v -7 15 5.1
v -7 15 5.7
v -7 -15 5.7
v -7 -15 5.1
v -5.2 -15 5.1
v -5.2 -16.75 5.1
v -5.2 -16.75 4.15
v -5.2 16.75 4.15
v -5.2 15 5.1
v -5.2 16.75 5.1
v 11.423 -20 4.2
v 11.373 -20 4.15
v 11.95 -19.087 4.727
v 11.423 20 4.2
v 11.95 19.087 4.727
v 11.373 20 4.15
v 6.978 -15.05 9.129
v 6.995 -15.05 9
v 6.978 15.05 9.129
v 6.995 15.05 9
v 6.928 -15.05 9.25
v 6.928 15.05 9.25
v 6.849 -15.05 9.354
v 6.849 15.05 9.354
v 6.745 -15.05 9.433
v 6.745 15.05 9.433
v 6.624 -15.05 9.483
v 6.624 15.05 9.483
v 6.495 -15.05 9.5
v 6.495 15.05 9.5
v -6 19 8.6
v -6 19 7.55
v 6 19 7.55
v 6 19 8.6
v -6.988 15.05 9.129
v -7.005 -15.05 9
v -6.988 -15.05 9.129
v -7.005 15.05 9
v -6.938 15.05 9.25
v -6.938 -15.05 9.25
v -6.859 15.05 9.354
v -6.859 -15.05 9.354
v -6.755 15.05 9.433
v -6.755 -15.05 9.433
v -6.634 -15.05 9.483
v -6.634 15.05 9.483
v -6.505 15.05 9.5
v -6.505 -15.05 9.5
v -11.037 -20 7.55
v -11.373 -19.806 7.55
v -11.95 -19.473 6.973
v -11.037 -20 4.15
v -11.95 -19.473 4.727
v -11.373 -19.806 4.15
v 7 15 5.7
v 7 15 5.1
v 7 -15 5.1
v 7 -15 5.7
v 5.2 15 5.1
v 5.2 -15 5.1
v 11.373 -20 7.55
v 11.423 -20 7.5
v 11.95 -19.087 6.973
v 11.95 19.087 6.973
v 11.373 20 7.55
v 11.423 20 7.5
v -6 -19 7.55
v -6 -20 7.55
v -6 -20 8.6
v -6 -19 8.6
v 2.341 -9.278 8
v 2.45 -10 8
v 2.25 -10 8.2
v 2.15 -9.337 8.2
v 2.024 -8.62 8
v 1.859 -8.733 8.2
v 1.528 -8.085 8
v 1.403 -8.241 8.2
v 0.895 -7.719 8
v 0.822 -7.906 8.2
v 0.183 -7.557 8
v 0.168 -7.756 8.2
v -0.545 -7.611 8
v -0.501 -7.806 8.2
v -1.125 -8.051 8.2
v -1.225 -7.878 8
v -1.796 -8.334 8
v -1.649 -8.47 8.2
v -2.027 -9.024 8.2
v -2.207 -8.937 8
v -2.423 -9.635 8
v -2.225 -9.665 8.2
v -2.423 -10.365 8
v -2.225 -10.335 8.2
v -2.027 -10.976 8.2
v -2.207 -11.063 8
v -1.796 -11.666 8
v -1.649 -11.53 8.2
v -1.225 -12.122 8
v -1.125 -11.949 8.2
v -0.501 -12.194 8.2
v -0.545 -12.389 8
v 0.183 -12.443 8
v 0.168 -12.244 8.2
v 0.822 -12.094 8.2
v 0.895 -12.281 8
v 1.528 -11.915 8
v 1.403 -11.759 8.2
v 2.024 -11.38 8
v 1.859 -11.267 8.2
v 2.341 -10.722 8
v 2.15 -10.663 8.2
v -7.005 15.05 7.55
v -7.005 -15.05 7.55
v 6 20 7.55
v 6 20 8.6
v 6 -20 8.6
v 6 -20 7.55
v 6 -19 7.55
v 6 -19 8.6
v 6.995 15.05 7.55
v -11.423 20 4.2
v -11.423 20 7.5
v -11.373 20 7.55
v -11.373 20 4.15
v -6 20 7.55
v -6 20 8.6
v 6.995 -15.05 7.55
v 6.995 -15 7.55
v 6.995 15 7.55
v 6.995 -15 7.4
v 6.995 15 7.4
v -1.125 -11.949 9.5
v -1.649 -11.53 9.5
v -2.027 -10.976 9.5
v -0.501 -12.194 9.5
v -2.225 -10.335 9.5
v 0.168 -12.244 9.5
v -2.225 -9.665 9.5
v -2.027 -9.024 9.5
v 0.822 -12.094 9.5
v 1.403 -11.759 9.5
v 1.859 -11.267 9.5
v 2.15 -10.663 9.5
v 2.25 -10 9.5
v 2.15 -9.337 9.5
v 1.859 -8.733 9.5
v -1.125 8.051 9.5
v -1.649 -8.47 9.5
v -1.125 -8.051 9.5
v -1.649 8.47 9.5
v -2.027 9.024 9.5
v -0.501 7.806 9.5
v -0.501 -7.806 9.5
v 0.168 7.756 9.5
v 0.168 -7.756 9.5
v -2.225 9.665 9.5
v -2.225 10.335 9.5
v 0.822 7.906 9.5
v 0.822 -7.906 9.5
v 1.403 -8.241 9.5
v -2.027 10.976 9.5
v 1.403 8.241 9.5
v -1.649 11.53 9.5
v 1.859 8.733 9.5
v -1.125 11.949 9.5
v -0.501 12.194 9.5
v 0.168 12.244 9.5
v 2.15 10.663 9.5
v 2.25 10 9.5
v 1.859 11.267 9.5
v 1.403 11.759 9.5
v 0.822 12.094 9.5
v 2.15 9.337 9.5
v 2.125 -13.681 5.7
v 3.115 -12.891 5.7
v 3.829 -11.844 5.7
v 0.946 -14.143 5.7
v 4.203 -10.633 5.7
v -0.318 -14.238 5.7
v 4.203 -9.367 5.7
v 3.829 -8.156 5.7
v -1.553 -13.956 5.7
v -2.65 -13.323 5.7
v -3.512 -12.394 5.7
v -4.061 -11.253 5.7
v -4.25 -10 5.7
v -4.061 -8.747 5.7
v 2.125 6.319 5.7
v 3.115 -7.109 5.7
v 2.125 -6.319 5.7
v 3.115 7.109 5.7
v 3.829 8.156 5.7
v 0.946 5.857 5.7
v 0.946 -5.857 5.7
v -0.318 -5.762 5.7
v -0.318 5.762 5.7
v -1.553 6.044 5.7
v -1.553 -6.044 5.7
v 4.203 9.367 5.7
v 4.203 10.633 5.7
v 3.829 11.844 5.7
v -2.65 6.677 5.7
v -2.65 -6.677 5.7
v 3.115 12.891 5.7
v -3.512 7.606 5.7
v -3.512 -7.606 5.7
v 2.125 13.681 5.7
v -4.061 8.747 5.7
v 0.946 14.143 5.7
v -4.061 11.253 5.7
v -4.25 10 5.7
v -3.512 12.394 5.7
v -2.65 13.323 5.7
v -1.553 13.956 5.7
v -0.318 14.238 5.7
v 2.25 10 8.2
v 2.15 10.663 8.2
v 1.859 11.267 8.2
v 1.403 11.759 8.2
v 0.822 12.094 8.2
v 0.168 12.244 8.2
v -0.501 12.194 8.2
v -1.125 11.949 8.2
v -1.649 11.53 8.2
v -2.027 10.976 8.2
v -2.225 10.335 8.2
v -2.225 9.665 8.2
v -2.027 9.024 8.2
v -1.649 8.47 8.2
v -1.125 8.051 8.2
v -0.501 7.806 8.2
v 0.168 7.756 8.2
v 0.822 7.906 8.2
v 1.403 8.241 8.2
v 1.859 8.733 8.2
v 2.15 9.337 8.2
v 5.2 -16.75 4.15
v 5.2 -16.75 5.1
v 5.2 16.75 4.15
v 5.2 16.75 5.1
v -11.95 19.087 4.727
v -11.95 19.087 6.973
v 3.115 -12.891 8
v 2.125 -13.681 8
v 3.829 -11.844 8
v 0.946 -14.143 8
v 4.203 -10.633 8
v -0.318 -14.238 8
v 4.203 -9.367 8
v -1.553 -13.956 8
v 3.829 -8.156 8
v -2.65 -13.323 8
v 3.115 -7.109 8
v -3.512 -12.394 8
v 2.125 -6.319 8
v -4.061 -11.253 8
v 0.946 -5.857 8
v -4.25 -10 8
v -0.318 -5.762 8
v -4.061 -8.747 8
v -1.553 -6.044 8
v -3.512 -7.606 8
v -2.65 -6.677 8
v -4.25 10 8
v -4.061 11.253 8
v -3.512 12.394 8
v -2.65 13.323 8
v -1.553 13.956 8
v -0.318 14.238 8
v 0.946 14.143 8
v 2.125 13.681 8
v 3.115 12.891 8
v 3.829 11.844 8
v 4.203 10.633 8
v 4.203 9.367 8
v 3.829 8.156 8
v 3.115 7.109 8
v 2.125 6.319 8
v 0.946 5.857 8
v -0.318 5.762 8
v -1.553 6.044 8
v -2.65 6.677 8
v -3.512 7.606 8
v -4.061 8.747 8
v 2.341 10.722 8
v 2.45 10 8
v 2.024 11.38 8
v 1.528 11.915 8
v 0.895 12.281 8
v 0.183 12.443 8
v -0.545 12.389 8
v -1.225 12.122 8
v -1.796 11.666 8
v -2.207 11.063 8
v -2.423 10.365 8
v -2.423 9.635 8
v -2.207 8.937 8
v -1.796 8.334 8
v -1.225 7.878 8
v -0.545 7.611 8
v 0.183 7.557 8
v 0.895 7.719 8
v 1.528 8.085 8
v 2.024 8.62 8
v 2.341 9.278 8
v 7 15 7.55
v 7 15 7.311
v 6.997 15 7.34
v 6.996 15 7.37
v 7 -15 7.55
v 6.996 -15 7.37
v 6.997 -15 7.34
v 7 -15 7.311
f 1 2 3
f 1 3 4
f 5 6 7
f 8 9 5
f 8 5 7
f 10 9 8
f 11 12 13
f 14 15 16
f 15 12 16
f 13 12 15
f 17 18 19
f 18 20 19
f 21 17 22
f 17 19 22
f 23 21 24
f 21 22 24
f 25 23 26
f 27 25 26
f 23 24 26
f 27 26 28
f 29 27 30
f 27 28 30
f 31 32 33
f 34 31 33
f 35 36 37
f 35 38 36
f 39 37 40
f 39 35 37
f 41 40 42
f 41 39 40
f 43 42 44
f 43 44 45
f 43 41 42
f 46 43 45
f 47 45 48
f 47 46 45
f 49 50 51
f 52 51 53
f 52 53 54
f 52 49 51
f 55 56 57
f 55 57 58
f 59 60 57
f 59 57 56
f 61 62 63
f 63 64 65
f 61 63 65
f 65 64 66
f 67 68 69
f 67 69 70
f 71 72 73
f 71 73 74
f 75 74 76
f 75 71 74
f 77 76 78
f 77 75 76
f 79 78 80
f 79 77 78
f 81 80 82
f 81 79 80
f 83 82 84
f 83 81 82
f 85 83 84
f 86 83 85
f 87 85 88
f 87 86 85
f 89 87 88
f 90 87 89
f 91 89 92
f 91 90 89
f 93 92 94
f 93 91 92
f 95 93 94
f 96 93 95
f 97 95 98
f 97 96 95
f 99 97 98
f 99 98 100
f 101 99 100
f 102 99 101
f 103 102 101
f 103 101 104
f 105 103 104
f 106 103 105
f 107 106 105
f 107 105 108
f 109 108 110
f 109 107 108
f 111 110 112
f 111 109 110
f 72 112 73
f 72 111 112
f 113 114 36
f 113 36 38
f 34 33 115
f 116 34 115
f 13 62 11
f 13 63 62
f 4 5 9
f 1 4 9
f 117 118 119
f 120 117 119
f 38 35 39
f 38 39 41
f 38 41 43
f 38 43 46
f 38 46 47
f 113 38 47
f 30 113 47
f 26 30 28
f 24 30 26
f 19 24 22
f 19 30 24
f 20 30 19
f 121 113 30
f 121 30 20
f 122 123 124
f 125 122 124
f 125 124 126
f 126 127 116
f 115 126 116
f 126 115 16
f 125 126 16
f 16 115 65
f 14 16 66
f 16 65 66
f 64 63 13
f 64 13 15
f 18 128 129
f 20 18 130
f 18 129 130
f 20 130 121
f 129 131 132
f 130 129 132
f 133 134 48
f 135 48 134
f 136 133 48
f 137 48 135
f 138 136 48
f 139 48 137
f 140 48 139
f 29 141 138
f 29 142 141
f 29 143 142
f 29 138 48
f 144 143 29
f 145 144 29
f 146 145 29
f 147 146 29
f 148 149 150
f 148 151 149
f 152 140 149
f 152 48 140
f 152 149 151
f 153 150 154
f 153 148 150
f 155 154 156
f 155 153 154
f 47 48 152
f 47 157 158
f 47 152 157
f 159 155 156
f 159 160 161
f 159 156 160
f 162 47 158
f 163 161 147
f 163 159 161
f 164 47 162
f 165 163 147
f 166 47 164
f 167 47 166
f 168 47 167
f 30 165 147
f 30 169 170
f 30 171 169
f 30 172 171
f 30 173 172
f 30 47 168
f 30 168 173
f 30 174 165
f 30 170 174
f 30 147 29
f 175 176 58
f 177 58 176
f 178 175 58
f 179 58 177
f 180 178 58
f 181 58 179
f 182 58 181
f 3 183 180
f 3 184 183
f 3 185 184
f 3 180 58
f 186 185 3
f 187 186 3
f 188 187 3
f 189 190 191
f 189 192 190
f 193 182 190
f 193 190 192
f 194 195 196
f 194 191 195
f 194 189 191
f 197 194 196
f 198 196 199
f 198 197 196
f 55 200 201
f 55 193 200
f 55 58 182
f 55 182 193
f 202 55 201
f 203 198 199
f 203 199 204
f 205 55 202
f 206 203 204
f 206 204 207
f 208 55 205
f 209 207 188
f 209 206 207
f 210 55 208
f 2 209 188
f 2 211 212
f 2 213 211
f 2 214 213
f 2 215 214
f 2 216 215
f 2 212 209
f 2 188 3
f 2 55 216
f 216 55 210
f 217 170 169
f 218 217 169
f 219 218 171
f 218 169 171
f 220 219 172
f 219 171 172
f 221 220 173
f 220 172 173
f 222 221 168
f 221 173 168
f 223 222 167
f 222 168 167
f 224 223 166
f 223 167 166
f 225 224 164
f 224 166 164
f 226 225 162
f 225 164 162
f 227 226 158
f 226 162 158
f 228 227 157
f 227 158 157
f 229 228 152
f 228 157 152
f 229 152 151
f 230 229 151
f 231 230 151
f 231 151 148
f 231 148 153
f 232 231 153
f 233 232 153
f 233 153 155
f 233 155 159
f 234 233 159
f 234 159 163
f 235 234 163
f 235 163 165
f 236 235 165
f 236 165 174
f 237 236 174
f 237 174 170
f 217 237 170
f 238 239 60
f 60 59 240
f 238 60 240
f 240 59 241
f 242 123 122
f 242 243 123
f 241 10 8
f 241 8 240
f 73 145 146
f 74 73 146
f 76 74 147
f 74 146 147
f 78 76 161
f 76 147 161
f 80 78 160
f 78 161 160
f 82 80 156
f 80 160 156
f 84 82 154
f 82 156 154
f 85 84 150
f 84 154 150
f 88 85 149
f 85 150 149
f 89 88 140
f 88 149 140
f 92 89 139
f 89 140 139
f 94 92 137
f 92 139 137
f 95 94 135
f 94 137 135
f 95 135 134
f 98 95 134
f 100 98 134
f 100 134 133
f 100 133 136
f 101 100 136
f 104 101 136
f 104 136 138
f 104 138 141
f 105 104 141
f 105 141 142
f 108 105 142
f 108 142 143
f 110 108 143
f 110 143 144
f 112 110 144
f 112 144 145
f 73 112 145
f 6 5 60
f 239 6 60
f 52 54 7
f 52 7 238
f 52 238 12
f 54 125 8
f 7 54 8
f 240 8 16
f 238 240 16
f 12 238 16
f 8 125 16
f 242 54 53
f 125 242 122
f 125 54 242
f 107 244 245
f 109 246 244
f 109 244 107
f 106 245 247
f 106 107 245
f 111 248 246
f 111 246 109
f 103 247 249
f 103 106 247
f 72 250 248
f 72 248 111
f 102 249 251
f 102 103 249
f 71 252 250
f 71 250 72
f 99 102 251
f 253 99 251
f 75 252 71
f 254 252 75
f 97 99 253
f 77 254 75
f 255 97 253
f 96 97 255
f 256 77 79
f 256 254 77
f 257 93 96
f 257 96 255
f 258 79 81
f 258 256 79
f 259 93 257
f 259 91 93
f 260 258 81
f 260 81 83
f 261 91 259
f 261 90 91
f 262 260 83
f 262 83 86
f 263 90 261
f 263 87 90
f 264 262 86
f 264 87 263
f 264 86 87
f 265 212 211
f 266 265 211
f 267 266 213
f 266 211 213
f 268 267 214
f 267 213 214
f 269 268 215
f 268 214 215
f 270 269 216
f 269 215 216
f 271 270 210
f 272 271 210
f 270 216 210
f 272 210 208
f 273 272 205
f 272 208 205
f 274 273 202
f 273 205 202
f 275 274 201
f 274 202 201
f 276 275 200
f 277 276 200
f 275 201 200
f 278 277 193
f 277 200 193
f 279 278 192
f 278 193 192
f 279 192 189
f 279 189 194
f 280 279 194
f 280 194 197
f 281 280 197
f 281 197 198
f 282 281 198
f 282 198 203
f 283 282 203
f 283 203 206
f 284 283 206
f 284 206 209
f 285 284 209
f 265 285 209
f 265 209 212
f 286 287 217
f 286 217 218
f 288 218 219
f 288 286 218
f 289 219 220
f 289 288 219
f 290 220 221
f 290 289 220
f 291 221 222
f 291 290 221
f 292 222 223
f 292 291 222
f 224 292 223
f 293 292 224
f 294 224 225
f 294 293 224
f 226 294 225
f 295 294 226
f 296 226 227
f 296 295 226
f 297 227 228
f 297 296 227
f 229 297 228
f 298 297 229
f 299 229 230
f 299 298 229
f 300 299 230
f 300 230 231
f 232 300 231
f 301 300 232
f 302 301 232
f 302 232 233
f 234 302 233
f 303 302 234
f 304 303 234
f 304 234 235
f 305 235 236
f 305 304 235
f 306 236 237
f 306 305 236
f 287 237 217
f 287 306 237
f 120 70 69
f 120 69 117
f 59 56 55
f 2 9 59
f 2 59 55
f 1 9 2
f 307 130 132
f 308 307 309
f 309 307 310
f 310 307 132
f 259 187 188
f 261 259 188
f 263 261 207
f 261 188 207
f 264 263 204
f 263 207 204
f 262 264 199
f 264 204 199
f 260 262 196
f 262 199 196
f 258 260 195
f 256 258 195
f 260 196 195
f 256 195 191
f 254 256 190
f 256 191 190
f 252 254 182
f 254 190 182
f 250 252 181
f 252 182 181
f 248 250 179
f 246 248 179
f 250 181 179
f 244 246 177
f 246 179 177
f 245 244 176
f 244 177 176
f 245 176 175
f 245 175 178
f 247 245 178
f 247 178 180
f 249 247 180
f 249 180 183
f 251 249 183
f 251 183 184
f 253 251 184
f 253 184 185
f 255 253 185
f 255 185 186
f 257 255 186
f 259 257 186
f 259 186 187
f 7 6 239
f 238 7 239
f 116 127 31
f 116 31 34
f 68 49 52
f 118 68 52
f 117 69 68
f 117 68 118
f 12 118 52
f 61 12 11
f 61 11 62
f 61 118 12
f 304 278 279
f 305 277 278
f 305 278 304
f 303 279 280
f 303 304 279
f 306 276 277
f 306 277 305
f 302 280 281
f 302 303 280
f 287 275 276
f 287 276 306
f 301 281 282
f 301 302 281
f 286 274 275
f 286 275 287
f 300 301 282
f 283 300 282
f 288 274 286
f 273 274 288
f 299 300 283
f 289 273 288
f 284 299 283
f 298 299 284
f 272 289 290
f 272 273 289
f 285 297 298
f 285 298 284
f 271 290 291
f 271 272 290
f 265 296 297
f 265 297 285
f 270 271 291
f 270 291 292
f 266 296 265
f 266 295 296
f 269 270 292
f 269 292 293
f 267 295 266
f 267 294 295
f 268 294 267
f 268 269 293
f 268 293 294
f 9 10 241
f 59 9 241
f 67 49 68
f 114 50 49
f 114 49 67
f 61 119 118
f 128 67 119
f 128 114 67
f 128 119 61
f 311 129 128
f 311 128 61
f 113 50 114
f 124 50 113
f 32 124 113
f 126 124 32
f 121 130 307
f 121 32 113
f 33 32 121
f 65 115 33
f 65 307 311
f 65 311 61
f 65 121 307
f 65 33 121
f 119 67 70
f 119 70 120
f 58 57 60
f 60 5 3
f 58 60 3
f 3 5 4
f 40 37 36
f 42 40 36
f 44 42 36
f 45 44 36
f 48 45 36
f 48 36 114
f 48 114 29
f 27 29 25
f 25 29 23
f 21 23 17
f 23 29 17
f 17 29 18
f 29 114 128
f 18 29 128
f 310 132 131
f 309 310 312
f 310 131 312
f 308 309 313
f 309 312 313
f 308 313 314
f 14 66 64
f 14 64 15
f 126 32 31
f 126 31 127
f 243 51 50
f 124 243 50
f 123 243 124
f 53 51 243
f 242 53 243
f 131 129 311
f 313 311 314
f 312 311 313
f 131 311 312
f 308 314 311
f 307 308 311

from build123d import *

# Parameters (mm, degrees)
SKETCH1_W                                        = 23.9
SKETCH1_H                                        = 40
BOSS_EXTRUDE1_DEPTH                              = 3.4
CUT_EXTRUDE1_DEPTH                               = 30
SKETCH3_W                                        = 14
SKETCH3_H                                        = 30.1
BOSS_EXTRUDE2_DEPTH                              = 1.95
SKETCH4_W                                        = 10.4
SKETCH4_H                                        = 30
CUT_EXTRUDE2_DEPTH                               = 1.55
CUT_EXTRUDE3_REACH                               = 2.95
SKETCH6_W                                        = 10.4
SKETCH6_H                                        = 1.75
CUT_EXTRUDE4_REACH                               = 2.95
SKETCH8_W                                        = 10.4
SKETCH8_H                                        = 1.75
SKETCH9_W                                        = 0.6
SKETCH9_H                                        = 30
CUT_EXTRUDE5_DEPTH                               = 1.8
SKETCH10_W                                       = 0.6
SKETCH10_H                                       = 30
CUT_EXTRUDE6_DEPTH                               = 1.8
SKETCH11_W                                       = 12
SKETCH11_H                                       = 1
BOSS_EXTRUDE3_DEPTH                              = 1.05
SKETCH12_W                                       = 12
SKETCH12_H                                       = 1
BOSS_EXTRUDE4_DEPTH                              = 1.05
CBORE_FOR_M4_HEX_HEAD_MACHINE_SCREW1_D           = 4.5
CBORE_FOR_M4_HEX_HEAD_MACHINE_SCREW1_DEPTH       = 3.8
CBORE_FOR_M4_HEX_HEAD_MACHINE_SCREW1_CBORE_D     = 8.5
CBORE_FOR_M4_HEX_HEAD_MACHINE_SCREW1_CBORE_DEPTH = 2.3
CHAMFER1_SIZE                                    = 0.527
CHAMFER1_SIZE2                                   = 0.913344887
CHAMFER1_PART_2_SIZE                             = 0.527
CHAMFER1_PART_2_SIZE2                            = 0.913344887
CHAMFER1_PART_3_SIZE                             = 0.527
CHAMFER1_PART_3_SIZE2                            = 0.913344887
CHAMFER2_SIZE                                    = 0.2
CHAMFER3_SIZE                                    = 0.577
CHAMFER4_SIZE                                    = 0.913344887
CHAMFER4_SIZE2                                   = 0.527
FILLET1_R                                        = 0.5


with BuildPart() as part:
    # Sketch1 → Boss-Extrude1 (new body)
    with BuildSketch(Plane.XY.offset(7.55)):
        Rectangle(SKETCH1_W, SKETCH1_H)
    extrude(amount=-BOSS_EXTRUDE1_DEPTH)

    # Sketch2 → Cut-Extrude1 (cut)
    with BuildSketch(Plane.XZ.offset(15)):
        with BuildLine():
            Line((7, 7.310697145), (7, 7.55))
            Line((7, 7.55), (6.995, 7.55))
            Line((6.995, 7.55), (6.995, 7.4))
            ThreePointArc((6.995, 7.4), (6.996250978, 7.35527864), (7, 7.310697145))
        make_face()
    extrude(amount=-CUT_EXTRUDE1_DEPTH, mode=Mode.SUBTRACT)

    # Sketch3 → Boss-Extrude2 (add)
    with BuildSketch(Plane.XY.offset(7.55)):
        with Locations((-0.005, 0)):
            Rectangle(SKETCH3_W, SKETCH3_H)
    extrude(amount=BOSS_EXTRUDE2_DEPTH)

    # Sketch4 → Cut-Extrude2 (cut)
    with BuildSketch(Plane(origin=(0, 0, 4.15), x_dir=(-1, 0, 0), z_dir=(0, 0, -1))):
        Rectangle(SKETCH4_W, SKETCH4_H)
    extrude(amount=-CUT_EXTRUDE2_DEPTH, mode=Mode.SUBTRACT)

    # Sketch6 → Cut-Extrude3 (cut, up to next)
    with BuildSketch(Plane.XY.offset(5.1), mode=Mode.PRIVATE) as cut_extrude3_sk1:
        with Locations((0, -15.875)):
            Rectangle(SKETCH6_W, SKETCH6_H)
    cut_extrude3_tool1 = extrude(cut_extrude3_sk1.sketch, amount=-CUT_EXTRUDE3_REACH, mode=Mode.PRIVATE) & part.part
    add(cut_extrude3_tool1.solids().sort_by_distance((0, -15.875, 5.1))[0], mode=Mode.SUBTRACT)

    # Sketch8 → Cut-Extrude4 (cut, up to next)
    with BuildSketch(Plane.XY.offset(5.1), mode=Mode.PRIVATE) as cut_extrude4_sk1:
        with Locations((0, 15.875)):
            Rectangle(SKETCH8_W, SKETCH8_H)
    cut_extrude4_tool1 = extrude(cut_extrude4_sk1.sketch, amount=-CUT_EXTRUDE4_REACH, mode=Mode.PRIVATE) & part.part
    add(cut_extrude4_tool1.solids().sort_by_distance((0, 15.875, 5.1))[0], mode=Mode.SUBTRACT)

    # Sketch9 → Cut-Extrude5 (cut)
    with BuildSketch(Plane(origin=(-5.2, 0, 0), x_dir=(0, 0, -1), z_dir=(1, 0, 0))):
        with Locations((-5.4, 0)):
            Rectangle(SKETCH9_W, SKETCH9_H)
    extrude(amount=-CUT_EXTRUDE5_DEPTH, mode=Mode.SUBTRACT)

    # Sketch10 → Cut-Extrude6 (cut)
    with BuildSketch(Plane.ZY.offset(-5.2)):
        with Locations((5.4, 0)):
            Rectangle(SKETCH10_W, SKETCH10_H)
    extrude(amount=-CUT_EXTRUDE6_DEPTH, mode=Mode.SUBTRACT)

    # Sketch11 → Boss-Extrude3 (add)
    with BuildSketch(Plane.XY.offset(7.55)):
        with Locations((0, 19.5)):
            Rectangle(SKETCH11_W, SKETCH11_H)
    extrude(amount=BOSS_EXTRUDE3_DEPTH)

    # Sketch12 → Boss-Extrude4 (add)
    with BuildSketch(Plane.XY.offset(7.55)):
        with Locations((0, -19.5)):
            Rectangle(SKETCH12_W, SKETCH12_H)
    extrude(amount=BOSS_EXTRUDE4_DEPTH)

    # CBORE for M4 Hex Head Machine Screw1
    with Locations(Plane(origin=(0, 0, 5.7), x_dir=(-1, 0, 0), z_dir=(0, 0, -1))):
        with Locations((0, 10), (0, -10)):
            CounterBoreHole(CBORE_FOR_M4_HEX_HEAD_MACHINE_SCREW1_D / 2, CBORE_FOR_M4_HEX_HEAD_MACHINE_SCREW1_CBORE_D / 2, CBORE_FOR_M4_HEX_HEAD_MACHINE_SCREW1_CBORE_DEPTH, depth=CBORE_FOR_M4_HEX_HEAD_MACHINE_SCREW1_DEPTH)

    # Chamfer1
    chamfer1_edges = [part.edges().sort_by_distance(p)[0] for p in [
        (-11.95, 20, 5.85),
    ]]
    chamfer1_side = [part.faces().sort_by_distance(p)[0] for p in [
        (0, 20, 6.148689538),
    ]]
    chamfer(chamfer1_edges, length=CHAMFER1_SIZE, length2=CHAMFER1_SIZE2, reference=chamfer1_side[0])

    # Chamfer1 part 2
    chamfer1_part_2_edges = [part.edges().sort_by_distance(p)[0] for p in [
        (11.95, -20, 5.85),
    ]]
    chamfer1_part_2_side = [part.faces().sort_by_distance(p)[0] for p in [
        (0, -20, 6.148689538),
    ]]
    chamfer(chamfer1_part_2_edges, length=CHAMFER1_PART_2_SIZE, length2=CHAMFER1_PART_2_SIZE2, reference=chamfer1_part_2_side[0])

    # Chamfer1 part 3
    chamfer1_part_3_edges = [part.edges().sort_by_distance(p)[0] for p in [
        (-11.95, -20, 5.85),
    ]]
    chamfer1_part_3_side = [part.faces().sort_by_distance(p)[0] for p in [
        (-11.95, 0, 5.85),
    ]]
    chamfer(chamfer1_part_3_edges, length=CHAMFER1_PART_3_SIZE, length2=CHAMFER1_PART_3_SIZE2, reference=chamfer1_part_3_side[0])

    # Chamfer2
    chamfer2_edges = [part.edges().sort_by_distance(p)[0] for p in [
        (-2.25, -10, 8),
        (-2.25, 10, 8),
    ]]
    chamfer(chamfer2_edges, length=CHAMFER2_SIZE)

    # Chamfer3
    chamfer3_edges = [part.edges().sort_by_distance(p)[0] for p in [
        (11.95, 0.456672444, 7.55),
        (11.95, 0.456672444, 4.15),
        (-11.95, -0.193172444, 4.15),
        (-11.95, -0.193172444, 7.55),
    ]]
    chamfer(chamfer3_edges, length=CHAMFER3_SIZE)

    # Chamfer4
    chamfer4_edges = [part.edges().sort_by_distance(p)[0] for p in [
        (11.95, 20, 5.85),
    ]]
    chamfer4_side = [part.faces().sort_by_distance(p)[0] for p in [
        (11.95, 0.456672444, 5.85),
    ]]
    chamfer(chamfer4_edges, length=CHAMFER4_SIZE, length2=CHAMFER4_SIZE2, reference=chamfer4_side[0])

    # Fillet1
    fillet1_edges = [part.edges().sort_by_distance(p)[0] for p in [
        (6.995, 0, 9.5),
        (-7.005, 0, 9.5),
    ]]
    fillet(fillet1_edges, radius=FILLET1_R)


solid = part.part
